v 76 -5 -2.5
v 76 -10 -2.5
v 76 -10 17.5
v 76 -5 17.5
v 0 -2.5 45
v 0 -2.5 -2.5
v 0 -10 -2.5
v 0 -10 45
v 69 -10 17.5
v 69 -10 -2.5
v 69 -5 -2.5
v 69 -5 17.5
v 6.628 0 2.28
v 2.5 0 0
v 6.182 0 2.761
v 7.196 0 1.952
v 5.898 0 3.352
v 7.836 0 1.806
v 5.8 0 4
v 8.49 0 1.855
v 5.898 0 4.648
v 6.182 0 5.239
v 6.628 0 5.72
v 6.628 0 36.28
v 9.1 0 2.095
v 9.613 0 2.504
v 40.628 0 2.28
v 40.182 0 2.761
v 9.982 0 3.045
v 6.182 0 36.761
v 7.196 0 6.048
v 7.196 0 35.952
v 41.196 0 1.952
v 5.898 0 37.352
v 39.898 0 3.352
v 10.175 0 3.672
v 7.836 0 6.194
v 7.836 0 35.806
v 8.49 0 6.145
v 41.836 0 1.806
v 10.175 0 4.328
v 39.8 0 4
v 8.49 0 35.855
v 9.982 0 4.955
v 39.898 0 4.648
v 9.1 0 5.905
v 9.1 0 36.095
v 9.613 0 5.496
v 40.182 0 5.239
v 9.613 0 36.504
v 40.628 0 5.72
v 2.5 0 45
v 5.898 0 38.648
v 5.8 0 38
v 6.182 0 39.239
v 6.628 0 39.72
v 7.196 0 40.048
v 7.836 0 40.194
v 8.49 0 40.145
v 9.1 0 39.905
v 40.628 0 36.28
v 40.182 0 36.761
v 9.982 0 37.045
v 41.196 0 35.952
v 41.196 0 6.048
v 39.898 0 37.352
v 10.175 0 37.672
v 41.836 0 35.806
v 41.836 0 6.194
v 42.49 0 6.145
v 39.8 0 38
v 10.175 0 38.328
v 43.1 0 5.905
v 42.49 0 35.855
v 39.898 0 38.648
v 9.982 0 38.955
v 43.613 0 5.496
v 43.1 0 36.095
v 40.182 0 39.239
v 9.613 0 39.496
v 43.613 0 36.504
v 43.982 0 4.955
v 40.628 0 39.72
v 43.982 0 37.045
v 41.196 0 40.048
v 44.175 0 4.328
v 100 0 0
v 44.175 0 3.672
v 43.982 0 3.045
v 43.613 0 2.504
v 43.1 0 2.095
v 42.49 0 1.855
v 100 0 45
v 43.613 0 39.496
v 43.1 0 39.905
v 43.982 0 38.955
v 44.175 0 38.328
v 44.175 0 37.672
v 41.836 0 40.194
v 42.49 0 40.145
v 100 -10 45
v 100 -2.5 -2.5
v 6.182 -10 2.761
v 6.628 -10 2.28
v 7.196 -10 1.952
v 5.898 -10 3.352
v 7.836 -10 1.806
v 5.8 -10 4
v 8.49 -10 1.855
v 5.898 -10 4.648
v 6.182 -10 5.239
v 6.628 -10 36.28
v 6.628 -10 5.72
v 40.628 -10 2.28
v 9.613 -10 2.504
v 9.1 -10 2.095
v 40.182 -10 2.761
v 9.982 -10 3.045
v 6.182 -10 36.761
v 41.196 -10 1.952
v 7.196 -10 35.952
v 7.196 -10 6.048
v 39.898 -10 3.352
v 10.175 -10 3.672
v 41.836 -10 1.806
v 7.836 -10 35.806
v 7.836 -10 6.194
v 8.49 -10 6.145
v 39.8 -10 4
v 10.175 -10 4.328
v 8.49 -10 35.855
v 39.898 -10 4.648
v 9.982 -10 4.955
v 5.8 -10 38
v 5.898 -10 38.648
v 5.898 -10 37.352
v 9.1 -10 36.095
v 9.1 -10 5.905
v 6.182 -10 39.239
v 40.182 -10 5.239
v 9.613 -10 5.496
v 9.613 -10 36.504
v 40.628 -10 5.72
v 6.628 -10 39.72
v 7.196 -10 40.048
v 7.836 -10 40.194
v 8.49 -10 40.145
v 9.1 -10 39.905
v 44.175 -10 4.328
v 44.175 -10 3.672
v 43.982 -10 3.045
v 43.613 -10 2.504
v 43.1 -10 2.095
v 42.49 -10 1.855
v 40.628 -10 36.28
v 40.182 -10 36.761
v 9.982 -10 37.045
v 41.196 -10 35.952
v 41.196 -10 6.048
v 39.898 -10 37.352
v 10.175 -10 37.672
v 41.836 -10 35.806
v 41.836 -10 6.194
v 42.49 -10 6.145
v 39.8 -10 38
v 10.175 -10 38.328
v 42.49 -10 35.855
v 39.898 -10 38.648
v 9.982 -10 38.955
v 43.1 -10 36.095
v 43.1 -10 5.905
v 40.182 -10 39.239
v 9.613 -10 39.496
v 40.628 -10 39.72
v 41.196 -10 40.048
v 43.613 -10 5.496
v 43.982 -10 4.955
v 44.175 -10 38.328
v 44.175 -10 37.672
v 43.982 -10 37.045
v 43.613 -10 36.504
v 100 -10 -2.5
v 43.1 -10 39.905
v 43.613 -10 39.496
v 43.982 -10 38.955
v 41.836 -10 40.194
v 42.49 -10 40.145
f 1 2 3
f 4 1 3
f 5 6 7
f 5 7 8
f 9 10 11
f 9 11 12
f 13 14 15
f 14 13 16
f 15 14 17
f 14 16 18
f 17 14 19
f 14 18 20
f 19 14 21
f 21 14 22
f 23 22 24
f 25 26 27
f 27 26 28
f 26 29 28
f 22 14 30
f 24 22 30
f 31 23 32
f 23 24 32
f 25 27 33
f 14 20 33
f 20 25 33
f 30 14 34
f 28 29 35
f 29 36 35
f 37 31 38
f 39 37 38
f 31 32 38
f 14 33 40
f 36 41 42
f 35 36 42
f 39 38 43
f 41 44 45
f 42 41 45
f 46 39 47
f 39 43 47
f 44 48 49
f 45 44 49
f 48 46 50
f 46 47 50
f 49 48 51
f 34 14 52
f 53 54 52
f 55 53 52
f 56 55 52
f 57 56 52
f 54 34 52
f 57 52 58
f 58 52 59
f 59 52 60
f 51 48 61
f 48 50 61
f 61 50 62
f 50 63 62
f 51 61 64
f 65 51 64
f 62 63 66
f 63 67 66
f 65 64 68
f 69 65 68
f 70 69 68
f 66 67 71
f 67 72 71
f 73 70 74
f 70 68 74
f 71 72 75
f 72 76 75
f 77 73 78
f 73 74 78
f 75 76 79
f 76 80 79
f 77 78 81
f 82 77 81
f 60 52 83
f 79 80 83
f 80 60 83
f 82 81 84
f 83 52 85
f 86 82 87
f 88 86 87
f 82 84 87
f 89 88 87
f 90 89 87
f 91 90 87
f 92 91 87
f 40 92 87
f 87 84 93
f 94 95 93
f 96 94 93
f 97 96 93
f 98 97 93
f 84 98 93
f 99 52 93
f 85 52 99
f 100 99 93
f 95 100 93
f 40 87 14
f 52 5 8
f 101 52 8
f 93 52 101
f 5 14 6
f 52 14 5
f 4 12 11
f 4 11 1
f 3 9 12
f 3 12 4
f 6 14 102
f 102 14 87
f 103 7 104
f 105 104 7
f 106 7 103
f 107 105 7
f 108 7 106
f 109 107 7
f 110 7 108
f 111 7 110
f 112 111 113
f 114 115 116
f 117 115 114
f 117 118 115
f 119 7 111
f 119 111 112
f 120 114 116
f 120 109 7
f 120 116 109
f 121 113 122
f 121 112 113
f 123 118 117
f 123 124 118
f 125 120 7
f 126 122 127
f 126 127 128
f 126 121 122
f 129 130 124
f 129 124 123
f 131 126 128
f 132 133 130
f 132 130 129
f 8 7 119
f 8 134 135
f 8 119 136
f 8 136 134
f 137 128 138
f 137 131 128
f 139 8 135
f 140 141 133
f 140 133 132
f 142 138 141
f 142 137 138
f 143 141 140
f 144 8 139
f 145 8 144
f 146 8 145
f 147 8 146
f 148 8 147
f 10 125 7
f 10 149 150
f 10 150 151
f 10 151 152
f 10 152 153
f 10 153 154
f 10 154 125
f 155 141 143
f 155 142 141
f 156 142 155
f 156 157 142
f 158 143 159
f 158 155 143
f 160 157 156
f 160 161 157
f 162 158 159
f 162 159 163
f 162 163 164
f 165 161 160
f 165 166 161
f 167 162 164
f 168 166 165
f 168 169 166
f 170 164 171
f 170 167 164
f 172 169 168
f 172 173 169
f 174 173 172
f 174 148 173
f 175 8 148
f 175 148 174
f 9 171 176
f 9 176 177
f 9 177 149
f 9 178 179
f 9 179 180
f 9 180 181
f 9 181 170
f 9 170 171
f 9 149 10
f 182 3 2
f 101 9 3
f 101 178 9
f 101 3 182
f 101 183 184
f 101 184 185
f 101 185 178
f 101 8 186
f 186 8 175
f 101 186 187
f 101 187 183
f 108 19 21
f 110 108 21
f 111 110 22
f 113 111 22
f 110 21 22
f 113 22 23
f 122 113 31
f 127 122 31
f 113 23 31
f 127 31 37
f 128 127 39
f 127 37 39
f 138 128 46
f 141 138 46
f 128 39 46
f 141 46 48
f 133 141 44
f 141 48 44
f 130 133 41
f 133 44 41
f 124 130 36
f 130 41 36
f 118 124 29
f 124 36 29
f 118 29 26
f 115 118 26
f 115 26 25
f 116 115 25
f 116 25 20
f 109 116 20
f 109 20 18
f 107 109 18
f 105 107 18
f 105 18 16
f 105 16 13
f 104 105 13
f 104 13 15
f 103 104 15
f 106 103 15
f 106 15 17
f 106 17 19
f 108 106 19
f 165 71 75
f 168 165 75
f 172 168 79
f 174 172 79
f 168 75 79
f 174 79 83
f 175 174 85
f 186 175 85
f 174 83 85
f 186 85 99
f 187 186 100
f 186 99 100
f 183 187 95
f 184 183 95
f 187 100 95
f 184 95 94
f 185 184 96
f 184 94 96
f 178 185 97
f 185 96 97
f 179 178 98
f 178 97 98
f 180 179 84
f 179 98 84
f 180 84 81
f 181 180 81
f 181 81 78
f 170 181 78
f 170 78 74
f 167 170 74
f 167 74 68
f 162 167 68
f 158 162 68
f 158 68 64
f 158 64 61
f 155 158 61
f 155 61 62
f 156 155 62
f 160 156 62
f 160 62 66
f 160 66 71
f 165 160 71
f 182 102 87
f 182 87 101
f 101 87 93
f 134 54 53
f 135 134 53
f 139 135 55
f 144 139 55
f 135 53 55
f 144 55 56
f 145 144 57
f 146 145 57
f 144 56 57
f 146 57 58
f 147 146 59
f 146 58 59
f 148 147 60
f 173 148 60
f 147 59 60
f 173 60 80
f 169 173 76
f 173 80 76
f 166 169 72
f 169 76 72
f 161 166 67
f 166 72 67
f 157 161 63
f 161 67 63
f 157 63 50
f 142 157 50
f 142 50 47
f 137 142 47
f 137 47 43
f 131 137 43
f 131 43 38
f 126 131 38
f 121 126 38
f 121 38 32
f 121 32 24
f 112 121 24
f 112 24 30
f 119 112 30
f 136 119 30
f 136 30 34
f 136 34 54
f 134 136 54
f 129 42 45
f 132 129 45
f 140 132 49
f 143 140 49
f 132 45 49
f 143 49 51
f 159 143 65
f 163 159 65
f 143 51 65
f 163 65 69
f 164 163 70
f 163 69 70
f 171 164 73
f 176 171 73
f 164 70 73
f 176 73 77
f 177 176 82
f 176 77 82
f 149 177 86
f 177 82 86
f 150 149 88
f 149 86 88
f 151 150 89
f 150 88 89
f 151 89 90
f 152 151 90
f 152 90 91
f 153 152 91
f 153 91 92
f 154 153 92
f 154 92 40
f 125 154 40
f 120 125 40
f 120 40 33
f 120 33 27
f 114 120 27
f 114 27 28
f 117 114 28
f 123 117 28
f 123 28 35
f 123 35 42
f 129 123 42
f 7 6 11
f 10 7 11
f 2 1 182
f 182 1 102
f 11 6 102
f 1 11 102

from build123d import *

# Parameters (mm, degrees)
F0_W     = 100
F0_H     = 47.5
F1_DEPTH = 10
F3_D     = 4.4
F2_W     = 7
F2_H     = 20
F4_DEPTH = 5
F5_SIZE  = 2.5


with BuildPart() as f1:
    # F0 (on Front) → F1 (new body)
    with BuildSketch(Plane.XZ):
        with Locations((50, 21.25)):
            Rectangle(F0_W, F0_H)
    extrude(amount=F1_DEPTH)

    # F3 (through all)
    with Locations(Plane.XZ.offset(10)):
        with Locations((8, 38), (42, 38), (42, 4), (8, 4)):
            Hole(F3_D / 2)

    # F2 (on face) → F4 (cut)
    with BuildSketch(Plane.XZ.offset(10)):
        with Locations((72.5, 7.5)):
            Rectangle(F2_W, F2_H)
    extrude(amount=-F4_DEPTH, mode=Mode.SUBTRACT)

    # F5
    f5_edges = [f1.edges().sort_by_distance(p)[0] for p in [
        (0, 0, 21.25),
        (50, 0, -2.5),
    ]]
    chamfer(f5_edges, length=F5_SIZE)


solid = f1.part
